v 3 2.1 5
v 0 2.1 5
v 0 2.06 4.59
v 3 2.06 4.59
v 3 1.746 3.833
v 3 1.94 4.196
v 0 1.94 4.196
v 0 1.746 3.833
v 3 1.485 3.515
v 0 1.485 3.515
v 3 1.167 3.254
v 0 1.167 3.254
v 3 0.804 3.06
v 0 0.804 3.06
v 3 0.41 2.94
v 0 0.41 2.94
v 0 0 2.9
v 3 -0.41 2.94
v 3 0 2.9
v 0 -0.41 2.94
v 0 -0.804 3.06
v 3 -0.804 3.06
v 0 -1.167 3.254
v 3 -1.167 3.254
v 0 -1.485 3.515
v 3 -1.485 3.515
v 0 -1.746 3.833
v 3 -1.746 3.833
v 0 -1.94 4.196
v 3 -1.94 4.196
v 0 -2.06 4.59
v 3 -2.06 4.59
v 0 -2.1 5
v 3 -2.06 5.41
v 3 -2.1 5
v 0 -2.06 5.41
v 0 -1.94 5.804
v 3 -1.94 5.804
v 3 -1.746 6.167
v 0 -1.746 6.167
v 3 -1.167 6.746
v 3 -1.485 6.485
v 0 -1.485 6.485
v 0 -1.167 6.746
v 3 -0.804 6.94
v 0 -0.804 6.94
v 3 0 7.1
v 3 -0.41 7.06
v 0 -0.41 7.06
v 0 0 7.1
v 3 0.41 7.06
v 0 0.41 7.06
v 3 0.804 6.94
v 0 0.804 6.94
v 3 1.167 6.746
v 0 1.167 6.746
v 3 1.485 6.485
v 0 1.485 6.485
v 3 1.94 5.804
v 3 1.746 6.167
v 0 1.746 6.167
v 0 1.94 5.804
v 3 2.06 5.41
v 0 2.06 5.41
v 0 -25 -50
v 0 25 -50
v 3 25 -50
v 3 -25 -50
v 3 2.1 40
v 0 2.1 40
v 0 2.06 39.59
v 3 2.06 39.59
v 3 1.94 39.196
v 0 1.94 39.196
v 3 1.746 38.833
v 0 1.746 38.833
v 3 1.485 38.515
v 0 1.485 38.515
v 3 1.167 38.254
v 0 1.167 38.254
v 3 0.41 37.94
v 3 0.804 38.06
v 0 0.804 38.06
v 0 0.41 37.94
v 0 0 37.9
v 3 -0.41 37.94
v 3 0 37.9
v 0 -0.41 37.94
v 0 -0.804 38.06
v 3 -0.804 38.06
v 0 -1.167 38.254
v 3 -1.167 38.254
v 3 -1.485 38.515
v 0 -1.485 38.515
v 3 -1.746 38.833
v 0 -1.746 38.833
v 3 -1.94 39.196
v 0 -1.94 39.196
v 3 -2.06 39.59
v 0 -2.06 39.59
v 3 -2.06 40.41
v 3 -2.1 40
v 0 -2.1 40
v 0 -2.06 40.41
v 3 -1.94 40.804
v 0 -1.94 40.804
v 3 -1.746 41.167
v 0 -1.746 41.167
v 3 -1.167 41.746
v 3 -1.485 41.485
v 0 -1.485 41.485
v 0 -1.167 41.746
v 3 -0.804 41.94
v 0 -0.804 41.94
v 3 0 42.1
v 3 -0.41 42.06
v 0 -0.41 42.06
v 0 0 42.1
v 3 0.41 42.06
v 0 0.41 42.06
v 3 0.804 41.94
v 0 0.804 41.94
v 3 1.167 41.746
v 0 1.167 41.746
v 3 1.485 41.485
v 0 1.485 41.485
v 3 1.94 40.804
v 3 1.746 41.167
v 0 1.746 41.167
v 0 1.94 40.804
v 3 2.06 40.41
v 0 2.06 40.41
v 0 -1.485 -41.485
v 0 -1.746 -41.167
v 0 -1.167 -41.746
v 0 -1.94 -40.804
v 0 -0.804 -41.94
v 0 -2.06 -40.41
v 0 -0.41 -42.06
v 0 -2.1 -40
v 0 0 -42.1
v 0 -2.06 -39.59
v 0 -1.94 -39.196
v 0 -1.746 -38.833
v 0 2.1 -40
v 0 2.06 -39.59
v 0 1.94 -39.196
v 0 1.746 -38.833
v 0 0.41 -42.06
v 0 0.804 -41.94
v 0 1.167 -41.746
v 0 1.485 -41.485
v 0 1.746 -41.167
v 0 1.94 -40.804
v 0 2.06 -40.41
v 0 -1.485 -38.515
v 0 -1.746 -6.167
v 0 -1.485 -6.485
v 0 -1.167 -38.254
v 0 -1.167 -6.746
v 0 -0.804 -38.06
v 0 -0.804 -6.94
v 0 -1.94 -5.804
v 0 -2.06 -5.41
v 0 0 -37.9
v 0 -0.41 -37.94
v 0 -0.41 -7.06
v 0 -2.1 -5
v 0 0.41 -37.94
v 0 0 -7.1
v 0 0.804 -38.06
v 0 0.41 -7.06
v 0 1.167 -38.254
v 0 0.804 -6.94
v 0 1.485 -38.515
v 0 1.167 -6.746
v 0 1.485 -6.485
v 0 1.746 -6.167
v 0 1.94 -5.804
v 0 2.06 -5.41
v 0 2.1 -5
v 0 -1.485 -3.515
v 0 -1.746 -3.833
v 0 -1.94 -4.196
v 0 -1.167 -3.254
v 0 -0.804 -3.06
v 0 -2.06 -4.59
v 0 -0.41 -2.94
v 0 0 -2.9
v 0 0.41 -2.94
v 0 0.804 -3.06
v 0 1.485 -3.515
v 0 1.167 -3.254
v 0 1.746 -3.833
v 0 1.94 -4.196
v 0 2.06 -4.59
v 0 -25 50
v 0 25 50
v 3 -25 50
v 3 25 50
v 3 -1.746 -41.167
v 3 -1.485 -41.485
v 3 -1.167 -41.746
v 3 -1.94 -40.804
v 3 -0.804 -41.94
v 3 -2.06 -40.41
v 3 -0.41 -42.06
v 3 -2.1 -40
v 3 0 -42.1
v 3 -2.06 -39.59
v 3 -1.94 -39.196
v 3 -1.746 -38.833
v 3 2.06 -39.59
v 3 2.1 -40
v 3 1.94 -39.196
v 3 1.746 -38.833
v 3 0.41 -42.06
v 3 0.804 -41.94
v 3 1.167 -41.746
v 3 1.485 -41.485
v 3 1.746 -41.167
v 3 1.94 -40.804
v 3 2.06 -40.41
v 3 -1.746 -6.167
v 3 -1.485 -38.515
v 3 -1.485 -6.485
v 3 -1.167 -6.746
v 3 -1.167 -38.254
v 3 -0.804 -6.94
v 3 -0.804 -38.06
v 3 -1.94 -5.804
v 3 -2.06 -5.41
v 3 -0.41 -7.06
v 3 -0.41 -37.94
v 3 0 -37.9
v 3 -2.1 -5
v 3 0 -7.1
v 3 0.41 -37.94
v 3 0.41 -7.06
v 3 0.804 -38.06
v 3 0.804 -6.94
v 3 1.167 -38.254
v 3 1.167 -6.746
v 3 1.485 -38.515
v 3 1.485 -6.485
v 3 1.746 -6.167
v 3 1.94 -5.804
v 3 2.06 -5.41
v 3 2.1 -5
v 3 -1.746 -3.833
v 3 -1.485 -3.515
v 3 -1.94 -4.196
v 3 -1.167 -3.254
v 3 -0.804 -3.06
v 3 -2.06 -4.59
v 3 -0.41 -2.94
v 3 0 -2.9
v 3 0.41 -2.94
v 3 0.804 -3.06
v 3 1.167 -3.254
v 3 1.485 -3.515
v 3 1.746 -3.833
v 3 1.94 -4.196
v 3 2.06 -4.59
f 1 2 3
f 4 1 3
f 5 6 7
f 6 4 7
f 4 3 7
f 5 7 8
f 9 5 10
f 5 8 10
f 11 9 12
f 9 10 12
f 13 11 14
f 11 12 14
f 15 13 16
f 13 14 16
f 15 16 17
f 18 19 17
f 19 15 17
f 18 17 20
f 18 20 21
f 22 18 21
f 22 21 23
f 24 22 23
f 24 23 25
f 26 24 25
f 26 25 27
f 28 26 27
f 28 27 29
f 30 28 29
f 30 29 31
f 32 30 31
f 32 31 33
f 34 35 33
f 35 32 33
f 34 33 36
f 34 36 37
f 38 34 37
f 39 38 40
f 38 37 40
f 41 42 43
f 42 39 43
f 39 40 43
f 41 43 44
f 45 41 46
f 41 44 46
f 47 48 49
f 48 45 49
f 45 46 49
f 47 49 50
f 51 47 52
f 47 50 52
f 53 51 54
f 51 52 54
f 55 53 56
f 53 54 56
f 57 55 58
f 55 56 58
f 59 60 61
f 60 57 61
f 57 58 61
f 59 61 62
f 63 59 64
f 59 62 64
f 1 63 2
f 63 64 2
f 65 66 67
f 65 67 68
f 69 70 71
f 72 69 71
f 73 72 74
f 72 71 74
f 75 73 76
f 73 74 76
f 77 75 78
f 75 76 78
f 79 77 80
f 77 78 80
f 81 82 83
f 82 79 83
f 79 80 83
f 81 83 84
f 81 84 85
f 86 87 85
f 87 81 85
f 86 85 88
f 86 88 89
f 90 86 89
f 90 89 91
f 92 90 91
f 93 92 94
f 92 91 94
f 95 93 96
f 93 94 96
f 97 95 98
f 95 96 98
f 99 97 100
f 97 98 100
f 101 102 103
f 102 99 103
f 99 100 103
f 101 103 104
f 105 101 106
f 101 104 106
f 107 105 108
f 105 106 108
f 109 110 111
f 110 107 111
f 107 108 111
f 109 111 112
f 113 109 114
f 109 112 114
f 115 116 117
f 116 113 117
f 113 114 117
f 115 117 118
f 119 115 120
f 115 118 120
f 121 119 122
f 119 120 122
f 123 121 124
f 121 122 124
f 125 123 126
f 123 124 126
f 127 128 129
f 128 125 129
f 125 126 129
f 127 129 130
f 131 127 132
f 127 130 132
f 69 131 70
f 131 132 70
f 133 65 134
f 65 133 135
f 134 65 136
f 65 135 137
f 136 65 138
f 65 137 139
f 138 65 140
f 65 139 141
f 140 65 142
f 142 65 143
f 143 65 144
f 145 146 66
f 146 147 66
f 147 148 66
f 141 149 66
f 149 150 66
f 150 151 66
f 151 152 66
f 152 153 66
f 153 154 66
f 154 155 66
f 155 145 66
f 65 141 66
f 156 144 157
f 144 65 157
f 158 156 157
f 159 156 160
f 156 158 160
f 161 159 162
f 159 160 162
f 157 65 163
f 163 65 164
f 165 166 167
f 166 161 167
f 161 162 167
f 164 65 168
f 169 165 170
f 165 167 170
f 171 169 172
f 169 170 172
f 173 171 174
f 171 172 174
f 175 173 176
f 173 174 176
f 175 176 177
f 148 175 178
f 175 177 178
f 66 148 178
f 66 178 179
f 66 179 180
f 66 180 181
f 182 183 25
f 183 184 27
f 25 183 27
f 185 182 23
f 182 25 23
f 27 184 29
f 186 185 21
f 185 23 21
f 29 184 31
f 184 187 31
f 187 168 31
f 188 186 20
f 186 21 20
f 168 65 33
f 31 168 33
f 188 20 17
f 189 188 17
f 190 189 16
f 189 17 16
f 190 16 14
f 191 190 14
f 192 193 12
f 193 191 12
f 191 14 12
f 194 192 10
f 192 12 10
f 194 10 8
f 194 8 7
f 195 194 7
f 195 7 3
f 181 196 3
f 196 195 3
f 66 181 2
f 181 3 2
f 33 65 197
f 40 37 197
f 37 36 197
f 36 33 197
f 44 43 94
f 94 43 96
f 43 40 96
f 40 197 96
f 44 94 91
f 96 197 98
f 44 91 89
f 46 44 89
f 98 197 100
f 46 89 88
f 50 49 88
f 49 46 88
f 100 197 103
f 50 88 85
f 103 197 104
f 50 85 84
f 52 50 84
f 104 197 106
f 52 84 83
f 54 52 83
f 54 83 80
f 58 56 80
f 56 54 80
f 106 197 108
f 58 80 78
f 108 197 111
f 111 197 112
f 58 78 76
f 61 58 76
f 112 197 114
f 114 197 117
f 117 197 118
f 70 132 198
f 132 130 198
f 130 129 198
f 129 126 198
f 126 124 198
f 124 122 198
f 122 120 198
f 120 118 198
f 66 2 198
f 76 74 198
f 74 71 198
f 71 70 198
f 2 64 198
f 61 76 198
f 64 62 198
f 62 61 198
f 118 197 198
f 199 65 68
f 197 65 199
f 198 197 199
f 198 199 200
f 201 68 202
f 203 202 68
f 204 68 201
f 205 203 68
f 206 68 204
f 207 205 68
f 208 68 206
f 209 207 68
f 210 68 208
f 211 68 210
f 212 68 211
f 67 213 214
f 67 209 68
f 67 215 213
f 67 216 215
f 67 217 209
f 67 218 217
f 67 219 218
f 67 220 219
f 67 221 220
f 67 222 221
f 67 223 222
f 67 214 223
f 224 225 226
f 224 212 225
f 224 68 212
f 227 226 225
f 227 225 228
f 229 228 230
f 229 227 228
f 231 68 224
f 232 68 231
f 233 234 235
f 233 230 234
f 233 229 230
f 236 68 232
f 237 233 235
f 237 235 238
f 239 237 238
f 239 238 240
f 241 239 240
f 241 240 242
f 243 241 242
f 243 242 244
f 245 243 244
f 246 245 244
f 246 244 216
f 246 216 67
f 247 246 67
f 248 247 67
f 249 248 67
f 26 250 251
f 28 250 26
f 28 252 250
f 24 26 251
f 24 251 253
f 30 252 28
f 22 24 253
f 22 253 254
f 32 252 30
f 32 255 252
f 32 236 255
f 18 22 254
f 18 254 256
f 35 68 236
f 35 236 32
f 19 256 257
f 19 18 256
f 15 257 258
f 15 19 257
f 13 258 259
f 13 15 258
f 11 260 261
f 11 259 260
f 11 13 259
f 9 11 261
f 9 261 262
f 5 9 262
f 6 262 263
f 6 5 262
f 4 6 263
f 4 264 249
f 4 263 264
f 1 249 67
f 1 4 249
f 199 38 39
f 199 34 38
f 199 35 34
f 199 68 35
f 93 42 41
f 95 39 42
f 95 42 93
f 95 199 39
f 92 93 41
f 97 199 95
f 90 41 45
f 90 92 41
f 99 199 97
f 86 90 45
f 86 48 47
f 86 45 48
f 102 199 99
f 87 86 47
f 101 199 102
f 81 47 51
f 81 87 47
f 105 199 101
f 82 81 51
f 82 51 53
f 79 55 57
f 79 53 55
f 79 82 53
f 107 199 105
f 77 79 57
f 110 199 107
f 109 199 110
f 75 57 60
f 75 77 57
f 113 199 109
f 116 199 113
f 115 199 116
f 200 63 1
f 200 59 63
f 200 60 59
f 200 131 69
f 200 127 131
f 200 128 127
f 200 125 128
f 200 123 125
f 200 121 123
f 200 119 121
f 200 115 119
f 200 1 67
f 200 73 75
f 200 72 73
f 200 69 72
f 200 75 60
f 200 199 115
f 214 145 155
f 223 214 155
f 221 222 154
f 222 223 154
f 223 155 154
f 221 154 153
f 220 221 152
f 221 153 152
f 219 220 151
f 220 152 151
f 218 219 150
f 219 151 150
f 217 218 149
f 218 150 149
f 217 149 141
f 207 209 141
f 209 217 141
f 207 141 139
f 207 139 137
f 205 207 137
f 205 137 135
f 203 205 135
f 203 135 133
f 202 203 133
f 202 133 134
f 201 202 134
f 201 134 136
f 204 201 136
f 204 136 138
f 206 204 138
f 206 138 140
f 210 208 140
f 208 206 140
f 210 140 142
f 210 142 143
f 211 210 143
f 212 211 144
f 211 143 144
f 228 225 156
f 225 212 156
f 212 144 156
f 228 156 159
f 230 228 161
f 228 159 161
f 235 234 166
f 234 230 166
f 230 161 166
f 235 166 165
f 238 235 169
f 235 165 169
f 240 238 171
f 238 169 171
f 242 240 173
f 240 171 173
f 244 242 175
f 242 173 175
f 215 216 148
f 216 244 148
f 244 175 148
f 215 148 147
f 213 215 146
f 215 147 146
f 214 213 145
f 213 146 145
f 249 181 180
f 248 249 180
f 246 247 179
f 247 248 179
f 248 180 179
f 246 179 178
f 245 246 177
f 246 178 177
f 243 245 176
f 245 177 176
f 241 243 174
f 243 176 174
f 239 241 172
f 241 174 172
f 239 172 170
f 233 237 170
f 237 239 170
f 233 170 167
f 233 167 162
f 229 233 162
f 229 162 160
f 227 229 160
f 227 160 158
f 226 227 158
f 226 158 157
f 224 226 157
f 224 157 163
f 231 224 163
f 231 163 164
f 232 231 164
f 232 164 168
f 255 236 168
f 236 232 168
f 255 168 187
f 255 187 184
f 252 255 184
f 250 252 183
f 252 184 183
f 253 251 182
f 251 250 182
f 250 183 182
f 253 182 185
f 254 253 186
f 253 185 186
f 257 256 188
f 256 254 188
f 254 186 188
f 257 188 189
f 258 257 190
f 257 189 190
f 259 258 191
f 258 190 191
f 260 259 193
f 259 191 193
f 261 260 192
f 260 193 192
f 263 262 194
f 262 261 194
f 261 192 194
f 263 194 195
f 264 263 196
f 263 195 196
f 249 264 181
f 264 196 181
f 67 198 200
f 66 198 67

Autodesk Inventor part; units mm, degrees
ref_plane "YZ Plane" through (0, 0, 0) normal (1, 0, 0) x (0, 1, 0)
ref_plane "XZ Plane" through (0, 0, 0) normal (0, 1, 0) x (-1, 0, 0)
ref_plane "XY Plane" through (0, 0, 0) normal (0, 0, 1) x (1, 0, 0)
sketch "Sketch1" plane through (0, 0, 0) normal (1, 0, 0) x (0, 1, 0)
  line L0 (-25, 50) -> (25, 50)
  line L1 (25, 50) -> (25, -50)
  line L2 (25, -50) -> (-25, -50)
  line L3 (-25, -50) -> (-25, 50)
  line L4 (-25, 50) -> (25, -50) construction
  line L5 (25, 50) -> (-25, -50) construction
  circle A0 centre (0, 40) radius 2.1
  circle A1 centre (0, 5) radius 2.1
  line L6 (0, 40) -> (0, 5)
  line L7 (25, 0) -> (-25, 0)
  circle A2 centre (0, -40) radius 2.1
  circle A3 centre (0, -5) radius 2.1
  point P0 (0, 0)
  point P1 (0, 50)
  dimension "d6" = 50
  dimension "d7" = 100
  dimension "d9" = 4.2
  dimension "d10" = 4.2
  dimension "d11" = 35
  dimension "d12" = 25
  dimension "d13" = 10
extrude "Extrusion2" add sketch "Sketch1" along normal blind 3
equation "\"d12\" = 0.5 * d6"
properties part number "motorPlate"
